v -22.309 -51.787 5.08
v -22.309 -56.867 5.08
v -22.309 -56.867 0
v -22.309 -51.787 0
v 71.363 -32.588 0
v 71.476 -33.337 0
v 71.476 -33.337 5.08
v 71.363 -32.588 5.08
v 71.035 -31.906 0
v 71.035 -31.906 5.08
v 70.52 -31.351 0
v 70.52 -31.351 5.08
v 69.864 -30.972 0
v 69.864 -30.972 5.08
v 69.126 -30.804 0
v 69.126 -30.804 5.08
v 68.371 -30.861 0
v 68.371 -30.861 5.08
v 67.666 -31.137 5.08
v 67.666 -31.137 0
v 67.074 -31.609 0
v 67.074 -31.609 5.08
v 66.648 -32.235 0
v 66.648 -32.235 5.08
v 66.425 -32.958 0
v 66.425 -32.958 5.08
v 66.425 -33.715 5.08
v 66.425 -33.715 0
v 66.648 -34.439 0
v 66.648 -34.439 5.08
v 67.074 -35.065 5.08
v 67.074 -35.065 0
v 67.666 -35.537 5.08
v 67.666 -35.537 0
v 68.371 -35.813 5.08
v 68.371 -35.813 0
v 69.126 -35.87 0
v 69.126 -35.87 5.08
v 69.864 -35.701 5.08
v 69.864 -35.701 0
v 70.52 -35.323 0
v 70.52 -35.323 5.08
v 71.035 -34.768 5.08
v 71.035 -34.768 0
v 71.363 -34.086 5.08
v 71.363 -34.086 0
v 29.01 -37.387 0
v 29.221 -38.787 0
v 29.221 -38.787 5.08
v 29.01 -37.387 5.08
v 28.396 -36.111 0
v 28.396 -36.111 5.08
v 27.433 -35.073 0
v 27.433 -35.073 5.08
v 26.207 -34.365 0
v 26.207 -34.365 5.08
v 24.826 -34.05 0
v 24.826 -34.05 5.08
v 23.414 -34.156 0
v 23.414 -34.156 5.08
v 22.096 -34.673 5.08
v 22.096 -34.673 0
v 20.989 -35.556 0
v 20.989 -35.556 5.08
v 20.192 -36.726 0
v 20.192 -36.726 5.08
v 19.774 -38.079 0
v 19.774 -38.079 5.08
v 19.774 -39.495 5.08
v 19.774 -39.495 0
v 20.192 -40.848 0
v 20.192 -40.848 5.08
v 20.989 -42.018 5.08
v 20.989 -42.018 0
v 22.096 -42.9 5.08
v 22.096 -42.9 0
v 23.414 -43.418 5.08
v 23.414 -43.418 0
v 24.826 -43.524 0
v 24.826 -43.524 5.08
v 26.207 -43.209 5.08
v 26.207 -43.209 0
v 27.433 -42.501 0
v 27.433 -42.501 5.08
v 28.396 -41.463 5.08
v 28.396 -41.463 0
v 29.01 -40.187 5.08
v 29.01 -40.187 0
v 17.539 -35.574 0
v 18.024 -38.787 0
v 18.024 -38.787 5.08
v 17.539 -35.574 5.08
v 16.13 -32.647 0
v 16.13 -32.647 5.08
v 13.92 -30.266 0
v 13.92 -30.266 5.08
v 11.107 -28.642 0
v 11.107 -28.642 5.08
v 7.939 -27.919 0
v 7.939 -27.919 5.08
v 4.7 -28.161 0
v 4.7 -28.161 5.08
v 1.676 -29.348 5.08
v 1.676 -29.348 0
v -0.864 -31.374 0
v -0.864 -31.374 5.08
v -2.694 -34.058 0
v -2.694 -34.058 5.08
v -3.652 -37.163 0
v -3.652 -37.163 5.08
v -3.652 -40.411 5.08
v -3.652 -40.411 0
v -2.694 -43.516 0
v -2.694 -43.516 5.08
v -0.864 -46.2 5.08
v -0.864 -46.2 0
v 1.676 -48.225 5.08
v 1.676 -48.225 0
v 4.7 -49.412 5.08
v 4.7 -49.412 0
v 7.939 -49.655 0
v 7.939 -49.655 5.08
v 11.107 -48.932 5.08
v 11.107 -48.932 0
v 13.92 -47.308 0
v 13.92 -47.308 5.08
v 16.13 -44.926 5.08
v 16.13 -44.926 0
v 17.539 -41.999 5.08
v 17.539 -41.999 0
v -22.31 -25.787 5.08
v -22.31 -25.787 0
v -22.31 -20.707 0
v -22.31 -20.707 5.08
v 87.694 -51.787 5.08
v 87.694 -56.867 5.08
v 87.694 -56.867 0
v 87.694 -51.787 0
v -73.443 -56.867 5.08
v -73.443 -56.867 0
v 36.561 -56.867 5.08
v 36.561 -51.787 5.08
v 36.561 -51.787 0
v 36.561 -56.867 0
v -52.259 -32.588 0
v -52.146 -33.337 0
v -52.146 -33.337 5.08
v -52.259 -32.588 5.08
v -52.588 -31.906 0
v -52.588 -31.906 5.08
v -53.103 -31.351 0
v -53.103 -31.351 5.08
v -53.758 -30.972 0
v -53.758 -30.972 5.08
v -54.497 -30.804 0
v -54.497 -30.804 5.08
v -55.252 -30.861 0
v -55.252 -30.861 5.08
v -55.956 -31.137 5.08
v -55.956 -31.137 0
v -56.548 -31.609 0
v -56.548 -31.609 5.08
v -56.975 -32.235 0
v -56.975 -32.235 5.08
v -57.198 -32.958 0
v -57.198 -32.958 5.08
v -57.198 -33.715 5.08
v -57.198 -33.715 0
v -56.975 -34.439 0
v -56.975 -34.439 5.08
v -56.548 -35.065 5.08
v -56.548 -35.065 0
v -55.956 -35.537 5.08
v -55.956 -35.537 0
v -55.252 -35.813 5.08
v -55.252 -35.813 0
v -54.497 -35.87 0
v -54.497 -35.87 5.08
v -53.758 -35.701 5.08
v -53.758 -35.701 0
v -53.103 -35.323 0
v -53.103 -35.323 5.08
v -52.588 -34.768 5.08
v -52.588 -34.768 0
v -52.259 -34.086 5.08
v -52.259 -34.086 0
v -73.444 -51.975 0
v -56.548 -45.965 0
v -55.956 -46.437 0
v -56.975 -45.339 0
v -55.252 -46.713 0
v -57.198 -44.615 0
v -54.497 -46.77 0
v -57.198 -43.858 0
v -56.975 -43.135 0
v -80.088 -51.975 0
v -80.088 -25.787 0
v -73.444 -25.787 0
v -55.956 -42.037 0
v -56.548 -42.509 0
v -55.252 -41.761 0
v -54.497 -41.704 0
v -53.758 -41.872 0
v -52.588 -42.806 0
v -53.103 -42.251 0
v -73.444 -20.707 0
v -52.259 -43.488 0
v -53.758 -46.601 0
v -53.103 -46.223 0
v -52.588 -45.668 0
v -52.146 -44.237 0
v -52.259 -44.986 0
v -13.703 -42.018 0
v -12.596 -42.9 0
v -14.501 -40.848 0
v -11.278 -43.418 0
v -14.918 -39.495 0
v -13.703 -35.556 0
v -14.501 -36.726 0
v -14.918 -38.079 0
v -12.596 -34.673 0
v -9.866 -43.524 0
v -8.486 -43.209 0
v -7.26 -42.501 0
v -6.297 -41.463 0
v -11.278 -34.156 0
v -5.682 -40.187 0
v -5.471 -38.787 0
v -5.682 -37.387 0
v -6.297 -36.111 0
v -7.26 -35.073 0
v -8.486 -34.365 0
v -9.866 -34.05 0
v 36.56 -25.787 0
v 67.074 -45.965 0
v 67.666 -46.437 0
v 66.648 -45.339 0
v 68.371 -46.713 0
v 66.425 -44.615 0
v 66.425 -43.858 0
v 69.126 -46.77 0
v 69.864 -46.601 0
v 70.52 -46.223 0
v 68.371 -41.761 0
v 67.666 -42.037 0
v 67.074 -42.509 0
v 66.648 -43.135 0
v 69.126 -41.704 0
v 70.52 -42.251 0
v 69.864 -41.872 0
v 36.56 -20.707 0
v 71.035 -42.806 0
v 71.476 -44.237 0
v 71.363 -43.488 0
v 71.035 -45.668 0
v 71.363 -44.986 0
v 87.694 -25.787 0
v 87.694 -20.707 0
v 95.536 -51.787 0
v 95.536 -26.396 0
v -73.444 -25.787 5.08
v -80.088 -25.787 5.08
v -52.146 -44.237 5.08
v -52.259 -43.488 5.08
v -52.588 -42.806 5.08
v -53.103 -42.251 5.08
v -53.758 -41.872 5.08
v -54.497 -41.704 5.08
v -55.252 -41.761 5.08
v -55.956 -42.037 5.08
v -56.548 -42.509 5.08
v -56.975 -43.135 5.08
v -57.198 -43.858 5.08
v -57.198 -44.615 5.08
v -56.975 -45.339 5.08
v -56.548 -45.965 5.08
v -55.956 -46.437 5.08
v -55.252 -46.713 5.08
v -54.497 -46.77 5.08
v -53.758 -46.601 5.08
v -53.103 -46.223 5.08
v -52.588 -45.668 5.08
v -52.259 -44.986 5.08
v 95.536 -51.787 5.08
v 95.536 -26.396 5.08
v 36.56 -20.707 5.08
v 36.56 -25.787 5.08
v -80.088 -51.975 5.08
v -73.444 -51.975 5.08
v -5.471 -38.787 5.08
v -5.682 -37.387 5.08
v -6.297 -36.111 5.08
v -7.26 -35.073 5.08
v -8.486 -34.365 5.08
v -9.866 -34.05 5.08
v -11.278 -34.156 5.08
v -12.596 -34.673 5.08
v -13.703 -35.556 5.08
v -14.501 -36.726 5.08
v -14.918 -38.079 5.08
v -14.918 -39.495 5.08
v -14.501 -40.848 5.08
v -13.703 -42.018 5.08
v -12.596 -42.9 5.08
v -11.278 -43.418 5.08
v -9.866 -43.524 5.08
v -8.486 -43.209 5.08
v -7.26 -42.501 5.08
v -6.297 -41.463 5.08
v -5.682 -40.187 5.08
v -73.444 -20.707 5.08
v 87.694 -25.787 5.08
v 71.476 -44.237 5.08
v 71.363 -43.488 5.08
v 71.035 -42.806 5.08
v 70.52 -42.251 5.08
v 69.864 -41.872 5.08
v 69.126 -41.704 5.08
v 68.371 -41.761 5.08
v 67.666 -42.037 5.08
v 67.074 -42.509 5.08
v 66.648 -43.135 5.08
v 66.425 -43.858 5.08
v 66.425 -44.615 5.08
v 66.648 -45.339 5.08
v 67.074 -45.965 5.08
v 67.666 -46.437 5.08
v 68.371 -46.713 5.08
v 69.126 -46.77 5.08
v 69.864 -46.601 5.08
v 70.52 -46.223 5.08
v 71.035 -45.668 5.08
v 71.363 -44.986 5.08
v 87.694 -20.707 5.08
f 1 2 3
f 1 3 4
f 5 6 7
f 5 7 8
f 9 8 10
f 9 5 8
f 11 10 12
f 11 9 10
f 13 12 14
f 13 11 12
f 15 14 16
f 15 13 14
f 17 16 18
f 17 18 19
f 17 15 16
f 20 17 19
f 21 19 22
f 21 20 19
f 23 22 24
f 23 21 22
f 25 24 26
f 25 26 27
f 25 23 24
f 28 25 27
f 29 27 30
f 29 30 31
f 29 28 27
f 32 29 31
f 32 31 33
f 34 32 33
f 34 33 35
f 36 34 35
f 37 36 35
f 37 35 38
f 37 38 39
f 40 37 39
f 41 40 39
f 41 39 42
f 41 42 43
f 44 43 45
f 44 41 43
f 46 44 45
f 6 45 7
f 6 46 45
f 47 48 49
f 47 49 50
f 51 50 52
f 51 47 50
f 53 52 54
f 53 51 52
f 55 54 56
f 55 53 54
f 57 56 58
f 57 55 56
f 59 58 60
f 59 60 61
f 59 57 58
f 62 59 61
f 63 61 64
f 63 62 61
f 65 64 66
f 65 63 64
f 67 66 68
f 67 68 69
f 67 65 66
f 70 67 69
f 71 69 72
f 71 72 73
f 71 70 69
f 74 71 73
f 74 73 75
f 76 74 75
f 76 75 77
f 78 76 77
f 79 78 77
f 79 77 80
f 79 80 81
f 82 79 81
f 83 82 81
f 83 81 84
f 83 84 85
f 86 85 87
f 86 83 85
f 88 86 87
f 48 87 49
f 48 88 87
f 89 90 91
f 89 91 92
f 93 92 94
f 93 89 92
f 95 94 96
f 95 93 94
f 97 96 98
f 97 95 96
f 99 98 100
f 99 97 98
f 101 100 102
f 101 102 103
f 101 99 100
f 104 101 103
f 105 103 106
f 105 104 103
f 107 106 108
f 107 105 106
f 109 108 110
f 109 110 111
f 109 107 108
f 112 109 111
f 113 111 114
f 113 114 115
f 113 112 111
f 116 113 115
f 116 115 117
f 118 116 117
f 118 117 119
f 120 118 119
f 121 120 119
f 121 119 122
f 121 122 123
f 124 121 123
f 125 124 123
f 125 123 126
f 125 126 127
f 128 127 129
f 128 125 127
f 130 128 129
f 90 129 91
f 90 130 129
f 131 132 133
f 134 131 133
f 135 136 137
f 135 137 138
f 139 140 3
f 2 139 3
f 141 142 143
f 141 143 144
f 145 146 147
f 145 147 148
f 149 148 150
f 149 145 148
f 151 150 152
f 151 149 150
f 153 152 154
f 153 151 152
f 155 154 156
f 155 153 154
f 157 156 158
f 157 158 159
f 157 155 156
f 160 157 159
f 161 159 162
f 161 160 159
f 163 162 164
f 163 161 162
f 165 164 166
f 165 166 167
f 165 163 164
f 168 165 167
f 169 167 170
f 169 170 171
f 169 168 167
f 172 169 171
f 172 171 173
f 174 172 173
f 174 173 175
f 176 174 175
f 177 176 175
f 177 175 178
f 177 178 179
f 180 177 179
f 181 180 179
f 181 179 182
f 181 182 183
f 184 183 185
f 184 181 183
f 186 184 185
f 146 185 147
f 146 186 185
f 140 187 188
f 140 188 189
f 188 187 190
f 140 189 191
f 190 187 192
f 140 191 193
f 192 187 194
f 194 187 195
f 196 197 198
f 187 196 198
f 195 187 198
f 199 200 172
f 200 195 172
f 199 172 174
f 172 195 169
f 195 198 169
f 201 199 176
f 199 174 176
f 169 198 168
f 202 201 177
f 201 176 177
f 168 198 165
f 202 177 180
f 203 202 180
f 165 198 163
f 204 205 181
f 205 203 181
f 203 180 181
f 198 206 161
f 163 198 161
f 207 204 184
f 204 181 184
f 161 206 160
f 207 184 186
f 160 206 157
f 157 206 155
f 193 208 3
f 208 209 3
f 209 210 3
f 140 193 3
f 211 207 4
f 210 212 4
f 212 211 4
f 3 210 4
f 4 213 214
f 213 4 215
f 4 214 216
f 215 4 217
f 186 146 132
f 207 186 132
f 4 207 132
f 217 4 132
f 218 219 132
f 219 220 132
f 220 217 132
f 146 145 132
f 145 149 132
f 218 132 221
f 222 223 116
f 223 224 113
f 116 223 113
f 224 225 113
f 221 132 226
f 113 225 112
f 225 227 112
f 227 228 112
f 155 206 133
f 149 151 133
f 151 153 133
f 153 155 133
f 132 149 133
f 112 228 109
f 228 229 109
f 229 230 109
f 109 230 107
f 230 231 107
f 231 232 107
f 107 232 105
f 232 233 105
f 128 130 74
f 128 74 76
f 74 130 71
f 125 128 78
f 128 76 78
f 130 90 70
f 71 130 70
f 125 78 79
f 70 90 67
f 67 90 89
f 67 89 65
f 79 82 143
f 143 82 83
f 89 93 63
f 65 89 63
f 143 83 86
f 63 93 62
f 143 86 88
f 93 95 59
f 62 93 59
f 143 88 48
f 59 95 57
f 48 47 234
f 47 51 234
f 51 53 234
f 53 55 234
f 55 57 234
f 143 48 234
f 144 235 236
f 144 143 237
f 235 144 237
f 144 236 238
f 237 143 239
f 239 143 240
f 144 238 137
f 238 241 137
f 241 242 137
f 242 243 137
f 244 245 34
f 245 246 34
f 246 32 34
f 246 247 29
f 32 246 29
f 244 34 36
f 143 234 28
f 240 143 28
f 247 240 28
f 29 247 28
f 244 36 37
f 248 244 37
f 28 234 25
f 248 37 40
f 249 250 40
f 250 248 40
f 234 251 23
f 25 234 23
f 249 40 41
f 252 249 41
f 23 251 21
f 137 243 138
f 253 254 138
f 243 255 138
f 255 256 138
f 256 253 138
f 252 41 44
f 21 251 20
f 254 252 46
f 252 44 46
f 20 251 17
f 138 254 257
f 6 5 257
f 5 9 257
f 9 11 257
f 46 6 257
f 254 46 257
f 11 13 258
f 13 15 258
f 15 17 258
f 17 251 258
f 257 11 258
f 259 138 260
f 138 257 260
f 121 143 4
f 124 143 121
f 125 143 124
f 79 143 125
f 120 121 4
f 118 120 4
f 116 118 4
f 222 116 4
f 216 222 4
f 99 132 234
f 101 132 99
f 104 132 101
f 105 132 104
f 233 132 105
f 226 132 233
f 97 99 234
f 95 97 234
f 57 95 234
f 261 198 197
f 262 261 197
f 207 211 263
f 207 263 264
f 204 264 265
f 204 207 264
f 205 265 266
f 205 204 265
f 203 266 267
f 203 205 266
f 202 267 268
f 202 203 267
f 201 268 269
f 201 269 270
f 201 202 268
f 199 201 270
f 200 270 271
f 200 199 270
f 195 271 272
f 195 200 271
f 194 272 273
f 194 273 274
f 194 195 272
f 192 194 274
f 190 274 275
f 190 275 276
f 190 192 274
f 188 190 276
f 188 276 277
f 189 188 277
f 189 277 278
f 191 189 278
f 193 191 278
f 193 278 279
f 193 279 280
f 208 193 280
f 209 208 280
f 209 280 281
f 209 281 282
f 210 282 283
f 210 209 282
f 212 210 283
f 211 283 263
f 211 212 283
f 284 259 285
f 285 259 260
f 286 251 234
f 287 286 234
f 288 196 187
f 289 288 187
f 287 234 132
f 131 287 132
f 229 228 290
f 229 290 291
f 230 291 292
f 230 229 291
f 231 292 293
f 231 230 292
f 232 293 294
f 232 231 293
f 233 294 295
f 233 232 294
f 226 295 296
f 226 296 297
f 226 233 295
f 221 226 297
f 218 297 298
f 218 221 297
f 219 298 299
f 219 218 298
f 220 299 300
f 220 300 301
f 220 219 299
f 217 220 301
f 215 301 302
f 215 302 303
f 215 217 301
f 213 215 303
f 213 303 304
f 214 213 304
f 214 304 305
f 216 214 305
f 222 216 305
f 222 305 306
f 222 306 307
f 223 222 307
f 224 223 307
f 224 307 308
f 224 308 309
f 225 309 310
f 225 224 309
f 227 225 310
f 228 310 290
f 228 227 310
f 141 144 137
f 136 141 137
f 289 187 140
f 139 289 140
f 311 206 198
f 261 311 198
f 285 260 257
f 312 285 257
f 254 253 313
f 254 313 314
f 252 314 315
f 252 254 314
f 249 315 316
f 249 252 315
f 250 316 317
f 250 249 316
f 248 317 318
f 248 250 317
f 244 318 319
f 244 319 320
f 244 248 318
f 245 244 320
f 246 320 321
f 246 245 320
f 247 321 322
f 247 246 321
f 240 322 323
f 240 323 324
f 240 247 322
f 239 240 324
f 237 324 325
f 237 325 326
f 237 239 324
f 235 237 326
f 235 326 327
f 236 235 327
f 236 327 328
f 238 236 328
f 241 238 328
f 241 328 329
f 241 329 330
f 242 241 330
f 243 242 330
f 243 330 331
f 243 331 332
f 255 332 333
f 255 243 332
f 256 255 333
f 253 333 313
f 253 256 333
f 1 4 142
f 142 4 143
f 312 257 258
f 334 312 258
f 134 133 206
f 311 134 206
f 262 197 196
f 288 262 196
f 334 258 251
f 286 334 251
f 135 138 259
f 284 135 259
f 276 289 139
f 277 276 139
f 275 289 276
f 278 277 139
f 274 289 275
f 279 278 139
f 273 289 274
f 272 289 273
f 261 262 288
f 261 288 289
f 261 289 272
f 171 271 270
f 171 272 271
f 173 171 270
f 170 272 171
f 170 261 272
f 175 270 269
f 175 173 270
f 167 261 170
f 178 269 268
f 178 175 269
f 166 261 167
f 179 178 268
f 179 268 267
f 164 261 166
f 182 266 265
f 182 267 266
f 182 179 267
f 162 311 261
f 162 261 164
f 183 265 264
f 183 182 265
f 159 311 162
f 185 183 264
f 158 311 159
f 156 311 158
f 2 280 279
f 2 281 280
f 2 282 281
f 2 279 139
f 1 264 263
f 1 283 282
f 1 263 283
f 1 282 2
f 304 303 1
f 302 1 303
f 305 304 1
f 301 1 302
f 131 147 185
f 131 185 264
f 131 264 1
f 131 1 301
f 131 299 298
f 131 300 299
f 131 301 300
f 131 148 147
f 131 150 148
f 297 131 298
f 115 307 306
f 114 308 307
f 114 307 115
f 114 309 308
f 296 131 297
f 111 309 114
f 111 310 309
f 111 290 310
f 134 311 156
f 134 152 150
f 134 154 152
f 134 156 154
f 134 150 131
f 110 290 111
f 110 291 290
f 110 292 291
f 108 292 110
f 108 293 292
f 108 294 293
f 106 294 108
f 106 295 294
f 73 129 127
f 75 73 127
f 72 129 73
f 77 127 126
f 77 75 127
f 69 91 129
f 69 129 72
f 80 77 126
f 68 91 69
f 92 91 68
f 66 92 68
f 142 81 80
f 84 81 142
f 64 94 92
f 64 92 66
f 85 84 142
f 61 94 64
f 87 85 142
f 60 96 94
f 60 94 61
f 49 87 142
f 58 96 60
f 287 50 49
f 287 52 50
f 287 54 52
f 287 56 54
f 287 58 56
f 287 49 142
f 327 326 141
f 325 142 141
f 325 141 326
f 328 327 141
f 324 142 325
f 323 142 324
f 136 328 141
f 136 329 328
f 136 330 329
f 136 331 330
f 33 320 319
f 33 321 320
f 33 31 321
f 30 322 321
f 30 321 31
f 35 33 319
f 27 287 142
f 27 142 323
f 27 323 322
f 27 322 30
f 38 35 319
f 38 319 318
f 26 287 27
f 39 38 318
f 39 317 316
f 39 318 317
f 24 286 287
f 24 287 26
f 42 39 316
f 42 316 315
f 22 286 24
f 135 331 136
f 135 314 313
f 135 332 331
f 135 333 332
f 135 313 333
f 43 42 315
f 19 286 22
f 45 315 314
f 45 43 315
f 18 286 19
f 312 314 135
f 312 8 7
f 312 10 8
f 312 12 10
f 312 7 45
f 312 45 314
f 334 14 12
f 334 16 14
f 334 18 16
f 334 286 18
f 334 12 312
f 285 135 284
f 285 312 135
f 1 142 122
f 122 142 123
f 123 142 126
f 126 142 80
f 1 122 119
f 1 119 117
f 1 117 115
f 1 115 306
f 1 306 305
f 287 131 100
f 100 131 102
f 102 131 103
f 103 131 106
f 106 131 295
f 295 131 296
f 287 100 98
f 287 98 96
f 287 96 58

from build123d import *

# Parameters (mm, degrees)
SKETCH1_R           = 2.54
SKETCH1_R_2         = 10.898656268
SKETCH1_R_3         = 4.749956202
BOSS_EXTRUDE1_DEPTH = 5.08


with BuildPart() as part:
    # Sketch1 → Boss-Extrude1 (new body)
    with BuildSketch(Plane.XY):
        Polygon((-22.310144528, -20.706897394), (-73.443857446, -20.706897394), (-73.443857446, -25.786897394), (-80.087904918, -25.786897394), (-80.087904918, -51.975164853), (-73.443857446, -51.975164853), (-73.442970039, -56.866897394), (-22.309257121, -56.866897394), (-22.309257121, -51.786897394), (36.560767605, -51.786897394), (36.560767605, -56.866897394), (87.694480523, -56.866897394), (87.694480523, -51.786897394), (95.535685575, -51.786897394), (95.535685575, -26.395813478), (87.693593116, -25.786897394), (87.693593116, -20.706897394), (36.559880198, -20.706897394), (36.559880198, -25.786897394), (-22.310144528, -25.786897394), align=None)
        with Locations((-54.686464291, -44.236903978)):
            Circle(SKETCH1_R, mode=Mode.SUBTRACT)
        with Locations((7.124867835, -38.786897394)):
            Circle(SKETCH1_R_2, mode=Mode.SUBTRACT)
        with Locations((68.93619996, -44.236903978)):
            Circle(SKETCH1_R, mode=Mode.SUBTRACT)
        with Locations((-54.686464291, -33.336890811)):
            Circle(SKETCH1_R, mode=Mode.SUBTRACT)
        with Locations((-10.221413257, -38.786897394)):
            Circle(SKETCH1_R_3, mode=Mode.SUBTRACT)
        with Locations((24.471148926, -38.786897394)):
            Circle(SKETCH1_R_3, mode=Mode.SUBTRACT)
        with Locations((68.93619996, -33.336890811)):
            Circle(SKETCH1_R, mode=Mode.SUBTRACT)
    extrude(amount=BOSS_EXTRUDE1_DEPTH)


solid = part.part
